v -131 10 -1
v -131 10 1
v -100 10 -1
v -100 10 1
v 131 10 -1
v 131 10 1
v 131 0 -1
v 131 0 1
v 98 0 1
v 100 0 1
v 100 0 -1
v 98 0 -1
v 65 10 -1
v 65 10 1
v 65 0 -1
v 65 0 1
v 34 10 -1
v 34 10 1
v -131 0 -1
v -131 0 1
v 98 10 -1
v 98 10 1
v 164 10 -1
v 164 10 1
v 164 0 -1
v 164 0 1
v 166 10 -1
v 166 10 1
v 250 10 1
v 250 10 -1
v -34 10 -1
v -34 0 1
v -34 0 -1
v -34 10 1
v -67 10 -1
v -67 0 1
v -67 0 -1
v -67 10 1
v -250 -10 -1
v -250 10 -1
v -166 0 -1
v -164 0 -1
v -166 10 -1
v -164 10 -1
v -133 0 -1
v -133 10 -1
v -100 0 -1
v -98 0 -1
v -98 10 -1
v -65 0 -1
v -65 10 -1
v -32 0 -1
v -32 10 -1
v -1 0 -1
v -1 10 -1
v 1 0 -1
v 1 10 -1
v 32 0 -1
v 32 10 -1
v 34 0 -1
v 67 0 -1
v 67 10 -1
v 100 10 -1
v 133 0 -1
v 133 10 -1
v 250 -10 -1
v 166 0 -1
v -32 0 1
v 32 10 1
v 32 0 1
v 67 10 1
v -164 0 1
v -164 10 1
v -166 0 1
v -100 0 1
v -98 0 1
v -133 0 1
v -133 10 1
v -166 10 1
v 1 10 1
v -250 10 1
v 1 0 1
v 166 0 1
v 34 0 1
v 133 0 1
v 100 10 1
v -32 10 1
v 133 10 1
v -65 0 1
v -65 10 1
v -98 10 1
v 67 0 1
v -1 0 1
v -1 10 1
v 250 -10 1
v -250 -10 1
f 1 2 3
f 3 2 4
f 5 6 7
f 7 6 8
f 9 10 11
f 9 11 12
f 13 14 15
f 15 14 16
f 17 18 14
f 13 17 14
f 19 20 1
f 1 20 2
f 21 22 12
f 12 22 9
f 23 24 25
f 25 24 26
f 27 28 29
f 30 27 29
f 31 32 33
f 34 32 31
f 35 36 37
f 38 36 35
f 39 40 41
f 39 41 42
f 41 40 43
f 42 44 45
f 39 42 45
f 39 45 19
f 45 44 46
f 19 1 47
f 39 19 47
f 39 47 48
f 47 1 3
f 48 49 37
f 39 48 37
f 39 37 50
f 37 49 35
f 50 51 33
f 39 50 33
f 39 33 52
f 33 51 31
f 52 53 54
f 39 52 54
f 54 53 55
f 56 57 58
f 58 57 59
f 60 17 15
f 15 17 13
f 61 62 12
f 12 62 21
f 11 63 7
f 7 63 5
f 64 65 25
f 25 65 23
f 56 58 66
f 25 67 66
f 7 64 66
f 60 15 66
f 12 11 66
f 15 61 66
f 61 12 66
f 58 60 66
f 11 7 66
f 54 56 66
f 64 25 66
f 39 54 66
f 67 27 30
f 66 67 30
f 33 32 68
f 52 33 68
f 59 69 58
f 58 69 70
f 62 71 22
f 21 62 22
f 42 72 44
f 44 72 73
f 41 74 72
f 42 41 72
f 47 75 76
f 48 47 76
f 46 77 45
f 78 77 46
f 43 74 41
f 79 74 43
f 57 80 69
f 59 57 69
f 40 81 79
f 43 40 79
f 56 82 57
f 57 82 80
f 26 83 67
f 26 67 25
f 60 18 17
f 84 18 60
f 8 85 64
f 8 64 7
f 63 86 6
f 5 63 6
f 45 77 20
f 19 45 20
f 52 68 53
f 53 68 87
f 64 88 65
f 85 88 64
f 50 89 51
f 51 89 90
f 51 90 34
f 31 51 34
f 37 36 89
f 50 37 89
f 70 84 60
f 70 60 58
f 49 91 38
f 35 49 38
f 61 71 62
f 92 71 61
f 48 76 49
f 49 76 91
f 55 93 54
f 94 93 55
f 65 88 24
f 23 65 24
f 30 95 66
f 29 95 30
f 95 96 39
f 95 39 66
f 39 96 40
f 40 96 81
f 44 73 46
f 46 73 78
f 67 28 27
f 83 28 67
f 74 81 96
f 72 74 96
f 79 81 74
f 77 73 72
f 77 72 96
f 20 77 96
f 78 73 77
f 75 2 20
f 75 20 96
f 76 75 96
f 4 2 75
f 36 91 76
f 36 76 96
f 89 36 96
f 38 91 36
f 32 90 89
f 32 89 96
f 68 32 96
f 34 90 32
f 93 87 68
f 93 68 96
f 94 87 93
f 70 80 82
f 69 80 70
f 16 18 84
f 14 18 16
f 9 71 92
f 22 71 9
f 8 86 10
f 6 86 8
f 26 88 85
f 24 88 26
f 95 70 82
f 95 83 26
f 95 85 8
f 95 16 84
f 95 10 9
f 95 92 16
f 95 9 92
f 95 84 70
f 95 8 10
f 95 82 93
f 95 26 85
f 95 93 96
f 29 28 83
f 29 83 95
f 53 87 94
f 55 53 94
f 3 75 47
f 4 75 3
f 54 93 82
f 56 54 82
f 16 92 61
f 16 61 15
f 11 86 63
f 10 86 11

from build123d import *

# Parameters (mm, degrees)
ESQUISSE1_W                = 500
ESQUISSE1_H                = 20
BOSS_EXTRU_1_DEPTH         = 1
ESQUISSE2_W                = 2
ESQUISSE2_H                = 10
ENL_V_MAT_EXTRU_1_DEPTH    = 3
R_P_TITION_LIN_AIRE3_COUNT = 6
R_P_TITION_LIN_AIRE3_PITCH = 33
SYM_TRIE1_COPY_1_SKETCH_W  = 2
SYM_TRIE1_COPY_1_SKETCH_H  = 10
SYM_TRIE1_COPY_1_DEPTH     = 3
SYM_TRIE1_COPY_2_SKETCH_W  = 2
SYM_TRIE1_COPY_2_SKETCH_H  = 10
SYM_TRIE1_COPY_2_DEPTH     = 3
SYM_TRIE1_COPY_3_SKETCH_W  = 2
SYM_TRIE1_COPY_3_SKETCH_H  = 10
SYM_TRIE1_COPY_3_DEPTH     = 3
SYM_TRIE1_COPY_4_SKETCH_W  = 2
SYM_TRIE1_COPY_4_SKETCH_H  = 10
SYM_TRIE1_COPY_4_DEPTH     = 3
SYM_TRIE1_COPY_5_SKETCH_W  = 2
SYM_TRIE1_COPY_5_SKETCH_H  = 10
SYM_TRIE1_COPY_5_DEPTH     = 3
SYM_TRIE1_COPY_6_SKETCH_W  = 2
SYM_TRIE1_COPY_6_SKETCH_H  = 10
SYM_TRIE1_COPY_6_DEPTH     = 3


with BuildPart() as part:
    # Esquisse1 → Boss.-Extru.1 (new body, symmetric)
    with BuildSketch(Plane.XY):
        Rectangle(ESQUISSE1_W, ESQUISSE1_H)
    extrude(amount=BOSS_EXTRU_1_DEPTH, both=True)

    # Esquisse2 → Enlèv. mat.-Extru.1 (cut, through all)
    with BuildSketch(Plane.XY.offset(1)):
        with Locations((0, 5)):
            Rectangle(ESQUISSE2_W, ESQUISSE2_H)
    enl_v_mat_extru_1 = extrude(amount=-ENL_V_MAT_EXTRU_1_DEPTH, mode=Mode.SUBTRACT)

    # Répétition linéaire3: Enlèv. mat.-Extru.1 ×6
    with Locations(*[(-i * R_P_TITION_LIN_AIRE3_PITCH, 0, 0) for i in range(1, R_P_TITION_LIN_AIRE3_COUNT)]):
        add(enl_v_mat_extru_1, mode=Mode.SUBTRACT)

    # Symétrie1 copy 1 sketch → Symétrie1 copy 1 (cut, through all)
    with BuildSketch(Plane(origin=(33, 0, 1), x_dir=(-1, 0, 0), z_dir=(0, 0, 1))):
        with Locations((0, -5)):
            Rectangle(SYM_TRIE1_COPY_1_SKETCH_W, SYM_TRIE1_COPY_1_SKETCH_H)
    extrude(amount=-SYM_TRIE1_COPY_1_DEPTH, mode=Mode.SUBTRACT)

    # Symétrie1 copy 2 sketch → Symétrie1 copy 2 (cut, through all)
    with BuildSketch(Plane(origin=(66, 0, 1), x_dir=(-1, 0, 0), z_dir=(0, 0, 1))):
        with Locations((0, -5)):
            Rectangle(SYM_TRIE1_COPY_2_SKETCH_W, SYM_TRIE1_COPY_2_SKETCH_H)
    extrude(amount=-SYM_TRIE1_COPY_2_DEPTH, mode=Mode.SUBTRACT)

    # Symétrie1 copy 3 sketch → Symétrie1 copy 3 (cut, through all)
    with BuildSketch(Plane(origin=(99, 0, 1), x_dir=(-1, 0, 0), z_dir=(0, 0, 1))):
        with Locations((0, -5)):
            Rectangle(SYM_TRIE1_COPY_3_SKETCH_W, SYM_TRIE1_COPY_3_SKETCH_H)
    extrude(amount=-SYM_TRIE1_COPY_3_DEPTH, mode=Mode.SUBTRACT)

    # Symétrie1 copy 4 sketch → Symétrie1 copy 4 (cut, through all)
    with BuildSketch(Plane(origin=(132, 0, 1), x_dir=(-1, 0, 0), z_dir=(0, 0, 1))):
        with Locations((0, -5)):
            Rectangle(SYM_TRIE1_COPY_4_SKETCH_W, SYM_TRIE1_COPY_4_SKETCH_H)
    extrude(amount=-SYM_TRIE1_COPY_4_DEPTH, mode=Mode.SUBTRACT)

    # Symétrie1 copy 5 sketch → Symétrie1 copy 5 (cut, through all)
    with BuildSketch(Plane(origin=(165, 0, 1), x_dir=(-1, 0, 0), z_dir=(0, 0, 1))):
        with Locations((0, -5)):
            Rectangle(SYM_TRIE1_COPY_5_SKETCH_W, SYM_TRIE1_COPY_5_SKETCH_H)
    extrude(amount=-SYM_TRIE1_COPY_5_DEPTH, mode=Mode.SUBTRACT)

    # Symétrie1 copy 6 sketch → Symétrie1 copy 6 (cut, through all)
    with BuildSketch(Plane(origin=(0, 0, 1), x_dir=(-1, 0, 0), z_dir=(0, 0, 1))):
        with Locations((0, -5)):
            Rectangle(SYM_TRIE1_COPY_6_SKETCH_W, SYM_TRIE1_COPY_6_SKETCH_H)
    extrude(amount=-SYM_TRIE1_COPY_6_DEPTH, mode=Mode.SUBTRACT)


solid = part.part
